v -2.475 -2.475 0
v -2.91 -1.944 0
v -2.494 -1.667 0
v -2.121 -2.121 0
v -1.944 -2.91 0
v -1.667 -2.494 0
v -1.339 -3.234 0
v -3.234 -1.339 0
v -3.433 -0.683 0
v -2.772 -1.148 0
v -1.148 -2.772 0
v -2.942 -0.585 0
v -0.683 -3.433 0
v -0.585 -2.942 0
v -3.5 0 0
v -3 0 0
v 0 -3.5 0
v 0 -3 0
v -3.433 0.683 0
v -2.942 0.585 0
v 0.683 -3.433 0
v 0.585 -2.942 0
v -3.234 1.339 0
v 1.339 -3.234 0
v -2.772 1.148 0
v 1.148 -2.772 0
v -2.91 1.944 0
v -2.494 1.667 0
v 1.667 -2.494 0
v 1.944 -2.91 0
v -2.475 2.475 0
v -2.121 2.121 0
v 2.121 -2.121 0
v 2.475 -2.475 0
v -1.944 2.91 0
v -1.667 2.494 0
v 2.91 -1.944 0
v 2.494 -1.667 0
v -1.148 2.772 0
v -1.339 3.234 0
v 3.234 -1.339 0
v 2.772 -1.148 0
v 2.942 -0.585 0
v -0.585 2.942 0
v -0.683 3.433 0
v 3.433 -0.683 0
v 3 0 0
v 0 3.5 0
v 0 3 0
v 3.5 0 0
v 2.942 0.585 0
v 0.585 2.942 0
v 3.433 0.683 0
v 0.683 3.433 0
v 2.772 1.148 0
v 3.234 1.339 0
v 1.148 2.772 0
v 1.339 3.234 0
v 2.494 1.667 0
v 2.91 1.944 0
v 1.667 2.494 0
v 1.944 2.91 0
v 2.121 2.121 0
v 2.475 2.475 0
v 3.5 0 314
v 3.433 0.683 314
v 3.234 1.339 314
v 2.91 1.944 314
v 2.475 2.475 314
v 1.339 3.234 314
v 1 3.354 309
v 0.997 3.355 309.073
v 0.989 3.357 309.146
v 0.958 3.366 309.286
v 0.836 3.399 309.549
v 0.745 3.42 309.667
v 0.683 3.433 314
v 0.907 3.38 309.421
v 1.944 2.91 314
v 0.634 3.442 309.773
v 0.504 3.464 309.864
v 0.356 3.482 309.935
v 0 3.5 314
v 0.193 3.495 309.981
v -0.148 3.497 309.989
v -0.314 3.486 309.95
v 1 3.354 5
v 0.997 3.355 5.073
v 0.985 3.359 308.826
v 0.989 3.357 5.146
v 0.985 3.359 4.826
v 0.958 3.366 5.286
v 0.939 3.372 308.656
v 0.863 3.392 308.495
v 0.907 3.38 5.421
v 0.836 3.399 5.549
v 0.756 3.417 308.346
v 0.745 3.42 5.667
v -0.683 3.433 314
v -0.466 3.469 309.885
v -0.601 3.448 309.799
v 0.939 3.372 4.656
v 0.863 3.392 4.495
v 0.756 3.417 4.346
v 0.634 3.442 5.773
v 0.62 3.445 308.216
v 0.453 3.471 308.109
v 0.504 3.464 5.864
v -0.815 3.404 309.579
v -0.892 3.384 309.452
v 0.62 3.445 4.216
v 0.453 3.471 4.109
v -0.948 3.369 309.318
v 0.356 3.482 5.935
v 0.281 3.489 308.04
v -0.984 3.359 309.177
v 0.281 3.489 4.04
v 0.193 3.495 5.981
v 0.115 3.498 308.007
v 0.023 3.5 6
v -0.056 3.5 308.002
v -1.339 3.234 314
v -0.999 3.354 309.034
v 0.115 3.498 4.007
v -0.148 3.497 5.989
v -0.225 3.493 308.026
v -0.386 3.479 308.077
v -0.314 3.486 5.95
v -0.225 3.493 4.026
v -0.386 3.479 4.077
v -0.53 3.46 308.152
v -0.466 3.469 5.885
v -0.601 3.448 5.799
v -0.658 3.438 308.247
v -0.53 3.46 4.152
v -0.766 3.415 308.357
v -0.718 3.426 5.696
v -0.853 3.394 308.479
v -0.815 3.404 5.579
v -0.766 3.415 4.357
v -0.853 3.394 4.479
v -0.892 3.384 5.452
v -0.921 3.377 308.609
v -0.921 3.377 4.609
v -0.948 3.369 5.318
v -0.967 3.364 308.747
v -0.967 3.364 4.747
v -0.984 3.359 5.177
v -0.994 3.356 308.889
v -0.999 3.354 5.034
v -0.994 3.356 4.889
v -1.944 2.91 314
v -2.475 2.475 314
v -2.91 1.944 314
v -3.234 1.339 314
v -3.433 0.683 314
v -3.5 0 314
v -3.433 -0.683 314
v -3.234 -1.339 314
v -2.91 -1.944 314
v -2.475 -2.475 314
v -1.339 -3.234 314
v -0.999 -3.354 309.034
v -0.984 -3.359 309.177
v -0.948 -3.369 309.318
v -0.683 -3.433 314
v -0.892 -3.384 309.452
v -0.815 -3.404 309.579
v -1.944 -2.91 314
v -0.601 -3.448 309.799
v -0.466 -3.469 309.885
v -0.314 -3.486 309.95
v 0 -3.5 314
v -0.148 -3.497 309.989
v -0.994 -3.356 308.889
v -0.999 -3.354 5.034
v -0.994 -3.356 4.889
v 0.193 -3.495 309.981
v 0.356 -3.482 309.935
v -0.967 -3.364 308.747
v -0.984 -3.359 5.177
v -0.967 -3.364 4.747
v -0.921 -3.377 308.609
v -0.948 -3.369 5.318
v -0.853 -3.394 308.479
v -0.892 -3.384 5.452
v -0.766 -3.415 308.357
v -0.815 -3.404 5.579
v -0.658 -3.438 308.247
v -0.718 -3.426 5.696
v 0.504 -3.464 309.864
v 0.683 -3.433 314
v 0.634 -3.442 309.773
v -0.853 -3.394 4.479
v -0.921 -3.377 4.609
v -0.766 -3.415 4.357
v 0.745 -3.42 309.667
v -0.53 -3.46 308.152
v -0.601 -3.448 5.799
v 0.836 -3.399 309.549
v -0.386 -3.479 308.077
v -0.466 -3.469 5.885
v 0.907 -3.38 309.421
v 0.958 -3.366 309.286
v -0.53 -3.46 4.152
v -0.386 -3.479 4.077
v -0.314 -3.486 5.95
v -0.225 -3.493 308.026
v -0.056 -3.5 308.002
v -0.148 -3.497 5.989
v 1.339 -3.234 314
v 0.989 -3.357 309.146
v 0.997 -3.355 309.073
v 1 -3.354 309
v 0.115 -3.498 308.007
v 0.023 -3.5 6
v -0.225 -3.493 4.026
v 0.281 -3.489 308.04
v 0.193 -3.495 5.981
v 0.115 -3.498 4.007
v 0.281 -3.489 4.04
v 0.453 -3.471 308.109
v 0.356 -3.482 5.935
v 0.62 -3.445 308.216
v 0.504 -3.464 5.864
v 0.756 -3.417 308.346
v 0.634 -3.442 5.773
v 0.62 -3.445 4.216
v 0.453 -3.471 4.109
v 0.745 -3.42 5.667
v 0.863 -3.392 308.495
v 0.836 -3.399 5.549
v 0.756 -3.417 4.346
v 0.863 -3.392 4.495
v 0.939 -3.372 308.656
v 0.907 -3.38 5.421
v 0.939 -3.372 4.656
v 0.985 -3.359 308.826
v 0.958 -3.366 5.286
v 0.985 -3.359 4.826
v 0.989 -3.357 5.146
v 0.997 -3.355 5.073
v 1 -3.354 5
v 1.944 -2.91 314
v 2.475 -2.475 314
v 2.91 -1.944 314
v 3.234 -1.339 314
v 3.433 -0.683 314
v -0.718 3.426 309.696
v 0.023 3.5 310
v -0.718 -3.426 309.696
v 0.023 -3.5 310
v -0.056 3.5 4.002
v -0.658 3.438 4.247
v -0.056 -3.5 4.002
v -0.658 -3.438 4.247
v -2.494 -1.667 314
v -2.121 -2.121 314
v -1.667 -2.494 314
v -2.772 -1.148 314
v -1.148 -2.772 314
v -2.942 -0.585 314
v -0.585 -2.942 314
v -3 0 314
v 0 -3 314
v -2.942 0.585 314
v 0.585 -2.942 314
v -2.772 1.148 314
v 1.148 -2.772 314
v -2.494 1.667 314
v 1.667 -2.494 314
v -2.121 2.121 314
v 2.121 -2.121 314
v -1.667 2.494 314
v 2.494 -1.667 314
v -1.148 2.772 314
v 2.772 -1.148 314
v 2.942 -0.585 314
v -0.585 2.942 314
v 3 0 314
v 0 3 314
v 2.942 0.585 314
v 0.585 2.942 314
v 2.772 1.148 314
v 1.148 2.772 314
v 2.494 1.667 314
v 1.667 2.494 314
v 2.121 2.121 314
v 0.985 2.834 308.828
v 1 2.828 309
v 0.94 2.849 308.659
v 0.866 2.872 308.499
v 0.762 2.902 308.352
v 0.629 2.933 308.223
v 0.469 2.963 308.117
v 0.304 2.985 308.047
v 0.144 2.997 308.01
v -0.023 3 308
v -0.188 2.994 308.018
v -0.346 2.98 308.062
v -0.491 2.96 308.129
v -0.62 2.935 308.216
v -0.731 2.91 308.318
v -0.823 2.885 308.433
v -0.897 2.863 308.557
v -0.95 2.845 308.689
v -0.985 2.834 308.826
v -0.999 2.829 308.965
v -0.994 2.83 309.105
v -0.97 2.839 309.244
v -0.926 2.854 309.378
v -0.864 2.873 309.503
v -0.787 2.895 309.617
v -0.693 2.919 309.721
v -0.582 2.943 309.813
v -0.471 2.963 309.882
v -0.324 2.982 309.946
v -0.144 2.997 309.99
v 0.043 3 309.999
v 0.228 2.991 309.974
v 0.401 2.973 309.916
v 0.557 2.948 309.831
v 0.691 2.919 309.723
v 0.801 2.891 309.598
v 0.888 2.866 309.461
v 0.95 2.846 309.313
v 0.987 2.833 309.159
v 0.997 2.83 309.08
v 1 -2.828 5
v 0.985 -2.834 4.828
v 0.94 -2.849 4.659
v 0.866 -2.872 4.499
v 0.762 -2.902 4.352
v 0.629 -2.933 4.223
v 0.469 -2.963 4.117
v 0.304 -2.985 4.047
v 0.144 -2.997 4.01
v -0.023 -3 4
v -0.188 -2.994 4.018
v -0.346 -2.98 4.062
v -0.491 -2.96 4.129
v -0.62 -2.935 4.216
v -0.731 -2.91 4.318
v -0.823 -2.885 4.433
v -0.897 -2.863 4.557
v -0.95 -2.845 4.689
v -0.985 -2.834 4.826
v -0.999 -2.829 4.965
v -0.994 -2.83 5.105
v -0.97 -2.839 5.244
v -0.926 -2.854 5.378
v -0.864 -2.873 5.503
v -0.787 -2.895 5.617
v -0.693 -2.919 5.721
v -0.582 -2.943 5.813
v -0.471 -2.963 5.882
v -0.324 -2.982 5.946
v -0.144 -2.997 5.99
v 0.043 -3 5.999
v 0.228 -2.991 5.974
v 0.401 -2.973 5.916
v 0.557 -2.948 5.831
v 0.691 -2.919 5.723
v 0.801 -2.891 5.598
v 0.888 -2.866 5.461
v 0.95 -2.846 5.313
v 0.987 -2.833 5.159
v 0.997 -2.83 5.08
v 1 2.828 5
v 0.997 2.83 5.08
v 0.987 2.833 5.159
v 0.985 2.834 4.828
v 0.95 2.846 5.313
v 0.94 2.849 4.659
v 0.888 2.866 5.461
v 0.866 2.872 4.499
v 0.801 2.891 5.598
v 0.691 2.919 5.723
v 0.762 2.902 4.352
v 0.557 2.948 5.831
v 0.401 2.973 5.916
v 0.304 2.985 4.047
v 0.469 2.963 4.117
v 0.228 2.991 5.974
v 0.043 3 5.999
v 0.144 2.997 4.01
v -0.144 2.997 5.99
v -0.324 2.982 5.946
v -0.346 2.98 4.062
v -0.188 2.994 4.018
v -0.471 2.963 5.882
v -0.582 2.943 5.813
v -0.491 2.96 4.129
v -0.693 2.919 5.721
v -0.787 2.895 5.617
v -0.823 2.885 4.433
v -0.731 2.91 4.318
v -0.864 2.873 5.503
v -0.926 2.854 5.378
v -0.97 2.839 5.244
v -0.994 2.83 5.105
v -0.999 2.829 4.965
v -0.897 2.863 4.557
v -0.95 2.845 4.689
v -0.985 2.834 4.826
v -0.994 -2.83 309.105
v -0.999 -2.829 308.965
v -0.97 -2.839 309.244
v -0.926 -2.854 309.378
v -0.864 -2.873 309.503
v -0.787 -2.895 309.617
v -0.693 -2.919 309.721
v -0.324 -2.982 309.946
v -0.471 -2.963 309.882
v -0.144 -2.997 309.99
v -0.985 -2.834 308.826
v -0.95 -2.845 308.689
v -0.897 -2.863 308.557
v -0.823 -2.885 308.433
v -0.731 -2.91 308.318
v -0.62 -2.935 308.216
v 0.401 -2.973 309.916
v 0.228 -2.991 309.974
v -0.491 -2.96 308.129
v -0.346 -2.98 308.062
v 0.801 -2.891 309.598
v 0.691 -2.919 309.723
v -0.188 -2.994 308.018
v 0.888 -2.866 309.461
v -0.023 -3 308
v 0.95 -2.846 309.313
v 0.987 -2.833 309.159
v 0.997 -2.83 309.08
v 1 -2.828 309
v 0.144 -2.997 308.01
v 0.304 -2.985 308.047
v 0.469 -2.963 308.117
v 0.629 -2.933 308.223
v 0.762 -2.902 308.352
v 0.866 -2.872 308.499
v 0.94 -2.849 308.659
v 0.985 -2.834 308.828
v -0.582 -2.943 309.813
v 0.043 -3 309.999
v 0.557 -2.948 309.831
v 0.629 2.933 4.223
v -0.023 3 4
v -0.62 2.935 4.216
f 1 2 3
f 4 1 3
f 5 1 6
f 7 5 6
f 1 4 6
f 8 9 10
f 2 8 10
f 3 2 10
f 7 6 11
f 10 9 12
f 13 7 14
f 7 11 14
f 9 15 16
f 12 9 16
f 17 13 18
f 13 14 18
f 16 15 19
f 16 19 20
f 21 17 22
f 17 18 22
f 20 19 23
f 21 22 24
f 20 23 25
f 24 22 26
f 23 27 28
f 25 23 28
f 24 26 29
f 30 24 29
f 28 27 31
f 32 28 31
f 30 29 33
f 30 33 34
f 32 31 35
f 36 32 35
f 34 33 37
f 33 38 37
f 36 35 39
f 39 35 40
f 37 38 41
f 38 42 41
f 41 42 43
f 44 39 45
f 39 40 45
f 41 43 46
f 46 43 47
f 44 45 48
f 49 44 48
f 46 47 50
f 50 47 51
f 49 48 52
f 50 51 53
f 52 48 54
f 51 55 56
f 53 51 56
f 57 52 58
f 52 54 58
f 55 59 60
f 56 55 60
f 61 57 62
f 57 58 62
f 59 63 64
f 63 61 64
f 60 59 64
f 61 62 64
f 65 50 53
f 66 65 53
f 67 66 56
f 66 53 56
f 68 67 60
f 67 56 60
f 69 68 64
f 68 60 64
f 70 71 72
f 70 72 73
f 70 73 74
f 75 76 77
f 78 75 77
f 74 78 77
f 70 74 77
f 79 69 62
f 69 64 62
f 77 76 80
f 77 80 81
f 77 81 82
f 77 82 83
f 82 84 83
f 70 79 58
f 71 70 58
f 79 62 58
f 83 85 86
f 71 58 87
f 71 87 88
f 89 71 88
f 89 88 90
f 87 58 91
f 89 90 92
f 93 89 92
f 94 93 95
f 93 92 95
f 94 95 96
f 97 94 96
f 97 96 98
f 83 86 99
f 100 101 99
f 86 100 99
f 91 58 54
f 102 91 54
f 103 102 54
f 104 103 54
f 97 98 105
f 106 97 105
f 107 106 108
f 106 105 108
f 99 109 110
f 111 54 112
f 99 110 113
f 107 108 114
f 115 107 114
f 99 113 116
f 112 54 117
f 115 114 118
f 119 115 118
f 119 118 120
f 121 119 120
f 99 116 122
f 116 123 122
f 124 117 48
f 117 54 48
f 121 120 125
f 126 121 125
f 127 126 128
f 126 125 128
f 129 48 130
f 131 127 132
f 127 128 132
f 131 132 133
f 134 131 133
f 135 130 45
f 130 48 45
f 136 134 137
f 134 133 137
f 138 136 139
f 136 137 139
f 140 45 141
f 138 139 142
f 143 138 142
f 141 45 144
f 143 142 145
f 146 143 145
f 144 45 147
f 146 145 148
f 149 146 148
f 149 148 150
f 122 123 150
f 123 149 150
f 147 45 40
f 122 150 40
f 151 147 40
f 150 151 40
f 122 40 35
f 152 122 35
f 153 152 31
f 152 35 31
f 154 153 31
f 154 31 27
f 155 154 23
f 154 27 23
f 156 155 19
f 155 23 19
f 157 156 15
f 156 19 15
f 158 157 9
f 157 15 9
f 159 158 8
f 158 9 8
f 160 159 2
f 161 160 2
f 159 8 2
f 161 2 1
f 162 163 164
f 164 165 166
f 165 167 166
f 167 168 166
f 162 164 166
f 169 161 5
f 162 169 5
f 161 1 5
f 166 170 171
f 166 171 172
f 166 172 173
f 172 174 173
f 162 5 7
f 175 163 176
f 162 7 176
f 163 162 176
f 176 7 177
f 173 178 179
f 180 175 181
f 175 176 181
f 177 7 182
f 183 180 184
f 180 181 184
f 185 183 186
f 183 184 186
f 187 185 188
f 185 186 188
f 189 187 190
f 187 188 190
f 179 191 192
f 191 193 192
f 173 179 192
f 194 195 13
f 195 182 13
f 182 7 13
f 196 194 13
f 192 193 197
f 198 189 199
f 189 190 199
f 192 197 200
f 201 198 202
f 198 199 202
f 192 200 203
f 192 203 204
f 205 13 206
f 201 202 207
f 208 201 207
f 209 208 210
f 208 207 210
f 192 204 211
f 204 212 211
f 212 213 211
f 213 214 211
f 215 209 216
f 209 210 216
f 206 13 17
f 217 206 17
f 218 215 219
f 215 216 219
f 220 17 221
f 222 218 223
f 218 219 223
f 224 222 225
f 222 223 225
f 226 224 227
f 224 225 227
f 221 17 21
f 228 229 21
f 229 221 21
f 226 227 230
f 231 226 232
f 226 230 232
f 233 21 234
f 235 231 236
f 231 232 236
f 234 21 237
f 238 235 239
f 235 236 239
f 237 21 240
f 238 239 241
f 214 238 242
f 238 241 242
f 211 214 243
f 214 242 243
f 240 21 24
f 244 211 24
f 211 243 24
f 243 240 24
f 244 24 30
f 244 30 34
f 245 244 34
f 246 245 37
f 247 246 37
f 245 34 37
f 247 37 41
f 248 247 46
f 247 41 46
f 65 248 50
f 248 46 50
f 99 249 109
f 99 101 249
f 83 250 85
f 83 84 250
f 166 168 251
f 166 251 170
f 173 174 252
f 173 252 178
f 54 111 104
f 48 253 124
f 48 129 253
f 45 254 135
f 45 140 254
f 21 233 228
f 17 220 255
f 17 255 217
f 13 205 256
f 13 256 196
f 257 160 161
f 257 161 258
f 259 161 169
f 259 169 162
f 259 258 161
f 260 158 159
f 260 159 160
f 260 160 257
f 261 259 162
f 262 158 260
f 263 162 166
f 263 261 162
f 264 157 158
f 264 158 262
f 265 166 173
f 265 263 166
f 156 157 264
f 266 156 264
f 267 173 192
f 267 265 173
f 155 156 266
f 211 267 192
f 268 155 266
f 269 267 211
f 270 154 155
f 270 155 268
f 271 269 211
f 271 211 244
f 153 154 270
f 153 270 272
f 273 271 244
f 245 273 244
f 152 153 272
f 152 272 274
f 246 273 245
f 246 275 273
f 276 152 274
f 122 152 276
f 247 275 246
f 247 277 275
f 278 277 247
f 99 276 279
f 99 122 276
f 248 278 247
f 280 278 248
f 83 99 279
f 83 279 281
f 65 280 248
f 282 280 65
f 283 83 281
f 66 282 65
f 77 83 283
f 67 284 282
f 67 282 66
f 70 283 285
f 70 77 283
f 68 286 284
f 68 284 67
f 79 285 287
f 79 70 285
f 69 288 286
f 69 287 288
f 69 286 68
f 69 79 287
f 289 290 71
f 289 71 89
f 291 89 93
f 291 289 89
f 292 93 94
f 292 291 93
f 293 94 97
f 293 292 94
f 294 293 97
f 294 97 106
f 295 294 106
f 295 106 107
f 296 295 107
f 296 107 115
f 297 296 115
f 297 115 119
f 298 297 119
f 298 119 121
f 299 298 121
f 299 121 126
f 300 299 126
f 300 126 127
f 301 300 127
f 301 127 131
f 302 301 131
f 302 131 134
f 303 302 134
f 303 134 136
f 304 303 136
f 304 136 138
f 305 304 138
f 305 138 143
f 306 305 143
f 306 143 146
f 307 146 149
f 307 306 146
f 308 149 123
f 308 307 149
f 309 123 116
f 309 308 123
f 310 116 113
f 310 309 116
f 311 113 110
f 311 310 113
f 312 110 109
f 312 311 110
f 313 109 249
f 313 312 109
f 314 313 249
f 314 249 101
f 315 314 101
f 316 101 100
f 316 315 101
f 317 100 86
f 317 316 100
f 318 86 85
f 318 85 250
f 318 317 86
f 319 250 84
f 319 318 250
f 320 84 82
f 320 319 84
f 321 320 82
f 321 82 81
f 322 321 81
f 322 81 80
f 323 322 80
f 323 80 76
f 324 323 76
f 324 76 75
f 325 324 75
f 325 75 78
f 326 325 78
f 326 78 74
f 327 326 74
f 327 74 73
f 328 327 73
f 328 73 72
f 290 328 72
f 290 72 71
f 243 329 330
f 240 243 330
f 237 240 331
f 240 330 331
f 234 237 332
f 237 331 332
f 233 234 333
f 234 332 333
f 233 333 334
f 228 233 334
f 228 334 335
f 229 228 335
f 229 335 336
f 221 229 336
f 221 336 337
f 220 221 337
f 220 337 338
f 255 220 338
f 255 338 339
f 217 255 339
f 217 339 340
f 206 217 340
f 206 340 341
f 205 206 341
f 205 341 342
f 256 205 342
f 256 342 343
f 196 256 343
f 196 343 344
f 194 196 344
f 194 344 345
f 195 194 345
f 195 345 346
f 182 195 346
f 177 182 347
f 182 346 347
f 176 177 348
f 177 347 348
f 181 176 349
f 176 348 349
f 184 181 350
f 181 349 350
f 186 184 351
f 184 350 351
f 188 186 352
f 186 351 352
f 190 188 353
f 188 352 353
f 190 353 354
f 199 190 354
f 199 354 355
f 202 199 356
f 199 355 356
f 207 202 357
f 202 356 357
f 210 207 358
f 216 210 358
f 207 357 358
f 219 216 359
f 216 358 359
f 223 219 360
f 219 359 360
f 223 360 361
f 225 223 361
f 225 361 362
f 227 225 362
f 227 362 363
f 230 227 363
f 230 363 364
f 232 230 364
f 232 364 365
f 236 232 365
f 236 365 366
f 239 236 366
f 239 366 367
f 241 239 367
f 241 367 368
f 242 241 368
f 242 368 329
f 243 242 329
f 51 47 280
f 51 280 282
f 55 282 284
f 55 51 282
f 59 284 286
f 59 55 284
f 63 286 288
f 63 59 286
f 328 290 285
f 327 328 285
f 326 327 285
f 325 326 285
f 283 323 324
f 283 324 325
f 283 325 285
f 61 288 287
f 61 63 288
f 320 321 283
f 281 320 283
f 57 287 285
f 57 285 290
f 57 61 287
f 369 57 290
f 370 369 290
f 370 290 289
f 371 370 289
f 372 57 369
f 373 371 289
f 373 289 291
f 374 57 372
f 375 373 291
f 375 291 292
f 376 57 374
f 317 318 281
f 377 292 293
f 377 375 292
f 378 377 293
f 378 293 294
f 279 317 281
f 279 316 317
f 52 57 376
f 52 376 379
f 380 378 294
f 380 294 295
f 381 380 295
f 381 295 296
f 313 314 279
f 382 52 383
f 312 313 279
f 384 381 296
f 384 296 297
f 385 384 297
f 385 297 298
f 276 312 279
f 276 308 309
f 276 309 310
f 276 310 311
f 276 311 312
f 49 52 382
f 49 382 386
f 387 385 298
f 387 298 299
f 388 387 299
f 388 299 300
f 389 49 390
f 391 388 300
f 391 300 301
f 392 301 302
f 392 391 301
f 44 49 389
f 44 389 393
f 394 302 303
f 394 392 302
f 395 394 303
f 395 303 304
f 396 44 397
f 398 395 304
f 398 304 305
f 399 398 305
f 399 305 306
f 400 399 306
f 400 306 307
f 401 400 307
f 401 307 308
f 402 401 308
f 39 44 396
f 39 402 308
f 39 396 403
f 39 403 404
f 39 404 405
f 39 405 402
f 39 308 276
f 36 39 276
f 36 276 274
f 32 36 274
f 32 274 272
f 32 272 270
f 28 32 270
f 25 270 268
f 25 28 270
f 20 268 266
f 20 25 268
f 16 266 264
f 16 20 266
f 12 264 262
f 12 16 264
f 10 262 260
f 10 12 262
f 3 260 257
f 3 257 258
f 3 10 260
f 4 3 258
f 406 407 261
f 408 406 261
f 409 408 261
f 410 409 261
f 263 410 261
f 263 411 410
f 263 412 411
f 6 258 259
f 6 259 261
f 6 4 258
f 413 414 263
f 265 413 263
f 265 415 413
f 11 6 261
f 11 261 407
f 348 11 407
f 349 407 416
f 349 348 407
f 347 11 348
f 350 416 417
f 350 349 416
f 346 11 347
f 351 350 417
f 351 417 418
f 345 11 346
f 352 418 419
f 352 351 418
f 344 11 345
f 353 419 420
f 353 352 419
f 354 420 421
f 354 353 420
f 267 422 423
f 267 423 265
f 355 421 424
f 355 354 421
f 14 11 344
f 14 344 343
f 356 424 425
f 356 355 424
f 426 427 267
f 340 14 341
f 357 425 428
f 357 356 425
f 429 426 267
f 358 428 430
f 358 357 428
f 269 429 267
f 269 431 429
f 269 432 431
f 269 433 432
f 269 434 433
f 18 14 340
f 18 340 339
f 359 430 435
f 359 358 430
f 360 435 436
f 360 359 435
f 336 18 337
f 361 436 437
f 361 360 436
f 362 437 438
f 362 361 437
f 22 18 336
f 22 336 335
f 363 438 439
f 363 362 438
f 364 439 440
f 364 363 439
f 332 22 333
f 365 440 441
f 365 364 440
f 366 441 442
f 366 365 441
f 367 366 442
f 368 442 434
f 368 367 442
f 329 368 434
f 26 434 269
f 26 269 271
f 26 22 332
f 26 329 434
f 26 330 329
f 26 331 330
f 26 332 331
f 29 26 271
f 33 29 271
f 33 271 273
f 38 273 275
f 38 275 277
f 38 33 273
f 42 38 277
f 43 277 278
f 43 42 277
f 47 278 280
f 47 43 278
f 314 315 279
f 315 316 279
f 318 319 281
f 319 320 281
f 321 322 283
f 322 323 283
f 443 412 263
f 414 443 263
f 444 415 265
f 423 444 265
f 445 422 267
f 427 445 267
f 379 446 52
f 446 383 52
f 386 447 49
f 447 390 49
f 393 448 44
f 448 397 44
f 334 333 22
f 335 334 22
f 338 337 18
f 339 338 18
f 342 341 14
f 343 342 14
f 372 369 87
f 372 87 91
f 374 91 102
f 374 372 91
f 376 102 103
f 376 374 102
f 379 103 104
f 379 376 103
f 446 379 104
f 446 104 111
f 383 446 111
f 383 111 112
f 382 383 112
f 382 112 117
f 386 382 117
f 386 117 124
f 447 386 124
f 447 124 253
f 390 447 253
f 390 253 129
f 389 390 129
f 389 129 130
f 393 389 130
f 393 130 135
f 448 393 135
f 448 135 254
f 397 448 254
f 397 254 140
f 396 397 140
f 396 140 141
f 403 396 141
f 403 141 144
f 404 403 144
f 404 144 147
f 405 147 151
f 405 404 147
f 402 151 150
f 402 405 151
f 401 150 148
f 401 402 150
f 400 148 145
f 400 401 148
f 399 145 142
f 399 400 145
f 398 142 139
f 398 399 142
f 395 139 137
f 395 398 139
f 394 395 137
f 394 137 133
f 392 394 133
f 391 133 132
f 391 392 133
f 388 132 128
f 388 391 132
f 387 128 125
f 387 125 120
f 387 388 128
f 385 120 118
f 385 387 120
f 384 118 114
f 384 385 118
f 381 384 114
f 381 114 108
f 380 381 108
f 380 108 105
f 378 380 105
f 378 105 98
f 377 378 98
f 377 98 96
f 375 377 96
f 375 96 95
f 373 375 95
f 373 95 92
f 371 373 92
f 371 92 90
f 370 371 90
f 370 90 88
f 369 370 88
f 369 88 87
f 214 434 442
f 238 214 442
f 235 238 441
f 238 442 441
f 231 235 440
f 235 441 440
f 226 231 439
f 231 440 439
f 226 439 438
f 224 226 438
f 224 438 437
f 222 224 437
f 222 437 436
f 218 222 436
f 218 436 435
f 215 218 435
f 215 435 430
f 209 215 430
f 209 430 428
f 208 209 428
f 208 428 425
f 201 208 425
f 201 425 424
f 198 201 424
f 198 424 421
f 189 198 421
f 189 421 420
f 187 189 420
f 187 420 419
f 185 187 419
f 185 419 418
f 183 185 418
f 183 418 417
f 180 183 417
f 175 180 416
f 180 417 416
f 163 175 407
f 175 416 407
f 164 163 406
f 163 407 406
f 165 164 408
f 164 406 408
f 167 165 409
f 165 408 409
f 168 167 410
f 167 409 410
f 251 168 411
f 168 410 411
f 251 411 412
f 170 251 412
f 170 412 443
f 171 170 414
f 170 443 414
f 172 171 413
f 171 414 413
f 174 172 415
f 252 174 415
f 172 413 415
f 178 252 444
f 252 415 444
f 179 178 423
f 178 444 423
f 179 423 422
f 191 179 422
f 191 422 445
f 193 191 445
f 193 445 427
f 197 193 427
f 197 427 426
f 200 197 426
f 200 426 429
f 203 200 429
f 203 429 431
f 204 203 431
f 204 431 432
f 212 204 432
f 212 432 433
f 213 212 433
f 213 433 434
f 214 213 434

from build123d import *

# Parameters (mm, degrees)
ESQUISSE1_R                  = 3.5
ESQUISSE1_R_2                = 3
BOSS_EXTRU_1_DEPTH           = 314
ENL_V_MAT_EXTRU_1_DEPTH      = 10
ENL_V_MAT_EXTRU_1_DEPTH_BACK = 10
ESQUISSE2_R                  = 1


with BuildPart() as part:
    # Esquisse1 → Boss.-Extru.1 (new body)
    with BuildSketch(Plane.XY):
        Circle(ESQUISSE1_R)
        Circle(ESQUISSE1_R_2, mode=Mode.SUBTRACT)
    extrude(amount=BOSS_EXTRU_1_DEPTH)

    # Esquisse2 → Enlèv. mat.-Extru.1 (cut, two sides: drawn at the far end of the back side and taken through both)
    with BuildSketch(Plane(origin=(0, 0, 0), x_dir=(1, 0, 0), z_dir=(0, 1, 0)).offset(-ENL_V_MAT_EXTRU_1_DEPTH_BACK)):
        with Locations((0, -309)):
            Circle(ESQUISSE2_R)
        with Locations((0, -5)):
            Circle(ESQUISSE2_R)
    extrude(amount=ENL_V_MAT_EXTRU_1_DEPTH + ENL_V_MAT_EXTRU_1_DEPTH_BACK, mode=Mode.SUBTRACT)


solid = part.part
